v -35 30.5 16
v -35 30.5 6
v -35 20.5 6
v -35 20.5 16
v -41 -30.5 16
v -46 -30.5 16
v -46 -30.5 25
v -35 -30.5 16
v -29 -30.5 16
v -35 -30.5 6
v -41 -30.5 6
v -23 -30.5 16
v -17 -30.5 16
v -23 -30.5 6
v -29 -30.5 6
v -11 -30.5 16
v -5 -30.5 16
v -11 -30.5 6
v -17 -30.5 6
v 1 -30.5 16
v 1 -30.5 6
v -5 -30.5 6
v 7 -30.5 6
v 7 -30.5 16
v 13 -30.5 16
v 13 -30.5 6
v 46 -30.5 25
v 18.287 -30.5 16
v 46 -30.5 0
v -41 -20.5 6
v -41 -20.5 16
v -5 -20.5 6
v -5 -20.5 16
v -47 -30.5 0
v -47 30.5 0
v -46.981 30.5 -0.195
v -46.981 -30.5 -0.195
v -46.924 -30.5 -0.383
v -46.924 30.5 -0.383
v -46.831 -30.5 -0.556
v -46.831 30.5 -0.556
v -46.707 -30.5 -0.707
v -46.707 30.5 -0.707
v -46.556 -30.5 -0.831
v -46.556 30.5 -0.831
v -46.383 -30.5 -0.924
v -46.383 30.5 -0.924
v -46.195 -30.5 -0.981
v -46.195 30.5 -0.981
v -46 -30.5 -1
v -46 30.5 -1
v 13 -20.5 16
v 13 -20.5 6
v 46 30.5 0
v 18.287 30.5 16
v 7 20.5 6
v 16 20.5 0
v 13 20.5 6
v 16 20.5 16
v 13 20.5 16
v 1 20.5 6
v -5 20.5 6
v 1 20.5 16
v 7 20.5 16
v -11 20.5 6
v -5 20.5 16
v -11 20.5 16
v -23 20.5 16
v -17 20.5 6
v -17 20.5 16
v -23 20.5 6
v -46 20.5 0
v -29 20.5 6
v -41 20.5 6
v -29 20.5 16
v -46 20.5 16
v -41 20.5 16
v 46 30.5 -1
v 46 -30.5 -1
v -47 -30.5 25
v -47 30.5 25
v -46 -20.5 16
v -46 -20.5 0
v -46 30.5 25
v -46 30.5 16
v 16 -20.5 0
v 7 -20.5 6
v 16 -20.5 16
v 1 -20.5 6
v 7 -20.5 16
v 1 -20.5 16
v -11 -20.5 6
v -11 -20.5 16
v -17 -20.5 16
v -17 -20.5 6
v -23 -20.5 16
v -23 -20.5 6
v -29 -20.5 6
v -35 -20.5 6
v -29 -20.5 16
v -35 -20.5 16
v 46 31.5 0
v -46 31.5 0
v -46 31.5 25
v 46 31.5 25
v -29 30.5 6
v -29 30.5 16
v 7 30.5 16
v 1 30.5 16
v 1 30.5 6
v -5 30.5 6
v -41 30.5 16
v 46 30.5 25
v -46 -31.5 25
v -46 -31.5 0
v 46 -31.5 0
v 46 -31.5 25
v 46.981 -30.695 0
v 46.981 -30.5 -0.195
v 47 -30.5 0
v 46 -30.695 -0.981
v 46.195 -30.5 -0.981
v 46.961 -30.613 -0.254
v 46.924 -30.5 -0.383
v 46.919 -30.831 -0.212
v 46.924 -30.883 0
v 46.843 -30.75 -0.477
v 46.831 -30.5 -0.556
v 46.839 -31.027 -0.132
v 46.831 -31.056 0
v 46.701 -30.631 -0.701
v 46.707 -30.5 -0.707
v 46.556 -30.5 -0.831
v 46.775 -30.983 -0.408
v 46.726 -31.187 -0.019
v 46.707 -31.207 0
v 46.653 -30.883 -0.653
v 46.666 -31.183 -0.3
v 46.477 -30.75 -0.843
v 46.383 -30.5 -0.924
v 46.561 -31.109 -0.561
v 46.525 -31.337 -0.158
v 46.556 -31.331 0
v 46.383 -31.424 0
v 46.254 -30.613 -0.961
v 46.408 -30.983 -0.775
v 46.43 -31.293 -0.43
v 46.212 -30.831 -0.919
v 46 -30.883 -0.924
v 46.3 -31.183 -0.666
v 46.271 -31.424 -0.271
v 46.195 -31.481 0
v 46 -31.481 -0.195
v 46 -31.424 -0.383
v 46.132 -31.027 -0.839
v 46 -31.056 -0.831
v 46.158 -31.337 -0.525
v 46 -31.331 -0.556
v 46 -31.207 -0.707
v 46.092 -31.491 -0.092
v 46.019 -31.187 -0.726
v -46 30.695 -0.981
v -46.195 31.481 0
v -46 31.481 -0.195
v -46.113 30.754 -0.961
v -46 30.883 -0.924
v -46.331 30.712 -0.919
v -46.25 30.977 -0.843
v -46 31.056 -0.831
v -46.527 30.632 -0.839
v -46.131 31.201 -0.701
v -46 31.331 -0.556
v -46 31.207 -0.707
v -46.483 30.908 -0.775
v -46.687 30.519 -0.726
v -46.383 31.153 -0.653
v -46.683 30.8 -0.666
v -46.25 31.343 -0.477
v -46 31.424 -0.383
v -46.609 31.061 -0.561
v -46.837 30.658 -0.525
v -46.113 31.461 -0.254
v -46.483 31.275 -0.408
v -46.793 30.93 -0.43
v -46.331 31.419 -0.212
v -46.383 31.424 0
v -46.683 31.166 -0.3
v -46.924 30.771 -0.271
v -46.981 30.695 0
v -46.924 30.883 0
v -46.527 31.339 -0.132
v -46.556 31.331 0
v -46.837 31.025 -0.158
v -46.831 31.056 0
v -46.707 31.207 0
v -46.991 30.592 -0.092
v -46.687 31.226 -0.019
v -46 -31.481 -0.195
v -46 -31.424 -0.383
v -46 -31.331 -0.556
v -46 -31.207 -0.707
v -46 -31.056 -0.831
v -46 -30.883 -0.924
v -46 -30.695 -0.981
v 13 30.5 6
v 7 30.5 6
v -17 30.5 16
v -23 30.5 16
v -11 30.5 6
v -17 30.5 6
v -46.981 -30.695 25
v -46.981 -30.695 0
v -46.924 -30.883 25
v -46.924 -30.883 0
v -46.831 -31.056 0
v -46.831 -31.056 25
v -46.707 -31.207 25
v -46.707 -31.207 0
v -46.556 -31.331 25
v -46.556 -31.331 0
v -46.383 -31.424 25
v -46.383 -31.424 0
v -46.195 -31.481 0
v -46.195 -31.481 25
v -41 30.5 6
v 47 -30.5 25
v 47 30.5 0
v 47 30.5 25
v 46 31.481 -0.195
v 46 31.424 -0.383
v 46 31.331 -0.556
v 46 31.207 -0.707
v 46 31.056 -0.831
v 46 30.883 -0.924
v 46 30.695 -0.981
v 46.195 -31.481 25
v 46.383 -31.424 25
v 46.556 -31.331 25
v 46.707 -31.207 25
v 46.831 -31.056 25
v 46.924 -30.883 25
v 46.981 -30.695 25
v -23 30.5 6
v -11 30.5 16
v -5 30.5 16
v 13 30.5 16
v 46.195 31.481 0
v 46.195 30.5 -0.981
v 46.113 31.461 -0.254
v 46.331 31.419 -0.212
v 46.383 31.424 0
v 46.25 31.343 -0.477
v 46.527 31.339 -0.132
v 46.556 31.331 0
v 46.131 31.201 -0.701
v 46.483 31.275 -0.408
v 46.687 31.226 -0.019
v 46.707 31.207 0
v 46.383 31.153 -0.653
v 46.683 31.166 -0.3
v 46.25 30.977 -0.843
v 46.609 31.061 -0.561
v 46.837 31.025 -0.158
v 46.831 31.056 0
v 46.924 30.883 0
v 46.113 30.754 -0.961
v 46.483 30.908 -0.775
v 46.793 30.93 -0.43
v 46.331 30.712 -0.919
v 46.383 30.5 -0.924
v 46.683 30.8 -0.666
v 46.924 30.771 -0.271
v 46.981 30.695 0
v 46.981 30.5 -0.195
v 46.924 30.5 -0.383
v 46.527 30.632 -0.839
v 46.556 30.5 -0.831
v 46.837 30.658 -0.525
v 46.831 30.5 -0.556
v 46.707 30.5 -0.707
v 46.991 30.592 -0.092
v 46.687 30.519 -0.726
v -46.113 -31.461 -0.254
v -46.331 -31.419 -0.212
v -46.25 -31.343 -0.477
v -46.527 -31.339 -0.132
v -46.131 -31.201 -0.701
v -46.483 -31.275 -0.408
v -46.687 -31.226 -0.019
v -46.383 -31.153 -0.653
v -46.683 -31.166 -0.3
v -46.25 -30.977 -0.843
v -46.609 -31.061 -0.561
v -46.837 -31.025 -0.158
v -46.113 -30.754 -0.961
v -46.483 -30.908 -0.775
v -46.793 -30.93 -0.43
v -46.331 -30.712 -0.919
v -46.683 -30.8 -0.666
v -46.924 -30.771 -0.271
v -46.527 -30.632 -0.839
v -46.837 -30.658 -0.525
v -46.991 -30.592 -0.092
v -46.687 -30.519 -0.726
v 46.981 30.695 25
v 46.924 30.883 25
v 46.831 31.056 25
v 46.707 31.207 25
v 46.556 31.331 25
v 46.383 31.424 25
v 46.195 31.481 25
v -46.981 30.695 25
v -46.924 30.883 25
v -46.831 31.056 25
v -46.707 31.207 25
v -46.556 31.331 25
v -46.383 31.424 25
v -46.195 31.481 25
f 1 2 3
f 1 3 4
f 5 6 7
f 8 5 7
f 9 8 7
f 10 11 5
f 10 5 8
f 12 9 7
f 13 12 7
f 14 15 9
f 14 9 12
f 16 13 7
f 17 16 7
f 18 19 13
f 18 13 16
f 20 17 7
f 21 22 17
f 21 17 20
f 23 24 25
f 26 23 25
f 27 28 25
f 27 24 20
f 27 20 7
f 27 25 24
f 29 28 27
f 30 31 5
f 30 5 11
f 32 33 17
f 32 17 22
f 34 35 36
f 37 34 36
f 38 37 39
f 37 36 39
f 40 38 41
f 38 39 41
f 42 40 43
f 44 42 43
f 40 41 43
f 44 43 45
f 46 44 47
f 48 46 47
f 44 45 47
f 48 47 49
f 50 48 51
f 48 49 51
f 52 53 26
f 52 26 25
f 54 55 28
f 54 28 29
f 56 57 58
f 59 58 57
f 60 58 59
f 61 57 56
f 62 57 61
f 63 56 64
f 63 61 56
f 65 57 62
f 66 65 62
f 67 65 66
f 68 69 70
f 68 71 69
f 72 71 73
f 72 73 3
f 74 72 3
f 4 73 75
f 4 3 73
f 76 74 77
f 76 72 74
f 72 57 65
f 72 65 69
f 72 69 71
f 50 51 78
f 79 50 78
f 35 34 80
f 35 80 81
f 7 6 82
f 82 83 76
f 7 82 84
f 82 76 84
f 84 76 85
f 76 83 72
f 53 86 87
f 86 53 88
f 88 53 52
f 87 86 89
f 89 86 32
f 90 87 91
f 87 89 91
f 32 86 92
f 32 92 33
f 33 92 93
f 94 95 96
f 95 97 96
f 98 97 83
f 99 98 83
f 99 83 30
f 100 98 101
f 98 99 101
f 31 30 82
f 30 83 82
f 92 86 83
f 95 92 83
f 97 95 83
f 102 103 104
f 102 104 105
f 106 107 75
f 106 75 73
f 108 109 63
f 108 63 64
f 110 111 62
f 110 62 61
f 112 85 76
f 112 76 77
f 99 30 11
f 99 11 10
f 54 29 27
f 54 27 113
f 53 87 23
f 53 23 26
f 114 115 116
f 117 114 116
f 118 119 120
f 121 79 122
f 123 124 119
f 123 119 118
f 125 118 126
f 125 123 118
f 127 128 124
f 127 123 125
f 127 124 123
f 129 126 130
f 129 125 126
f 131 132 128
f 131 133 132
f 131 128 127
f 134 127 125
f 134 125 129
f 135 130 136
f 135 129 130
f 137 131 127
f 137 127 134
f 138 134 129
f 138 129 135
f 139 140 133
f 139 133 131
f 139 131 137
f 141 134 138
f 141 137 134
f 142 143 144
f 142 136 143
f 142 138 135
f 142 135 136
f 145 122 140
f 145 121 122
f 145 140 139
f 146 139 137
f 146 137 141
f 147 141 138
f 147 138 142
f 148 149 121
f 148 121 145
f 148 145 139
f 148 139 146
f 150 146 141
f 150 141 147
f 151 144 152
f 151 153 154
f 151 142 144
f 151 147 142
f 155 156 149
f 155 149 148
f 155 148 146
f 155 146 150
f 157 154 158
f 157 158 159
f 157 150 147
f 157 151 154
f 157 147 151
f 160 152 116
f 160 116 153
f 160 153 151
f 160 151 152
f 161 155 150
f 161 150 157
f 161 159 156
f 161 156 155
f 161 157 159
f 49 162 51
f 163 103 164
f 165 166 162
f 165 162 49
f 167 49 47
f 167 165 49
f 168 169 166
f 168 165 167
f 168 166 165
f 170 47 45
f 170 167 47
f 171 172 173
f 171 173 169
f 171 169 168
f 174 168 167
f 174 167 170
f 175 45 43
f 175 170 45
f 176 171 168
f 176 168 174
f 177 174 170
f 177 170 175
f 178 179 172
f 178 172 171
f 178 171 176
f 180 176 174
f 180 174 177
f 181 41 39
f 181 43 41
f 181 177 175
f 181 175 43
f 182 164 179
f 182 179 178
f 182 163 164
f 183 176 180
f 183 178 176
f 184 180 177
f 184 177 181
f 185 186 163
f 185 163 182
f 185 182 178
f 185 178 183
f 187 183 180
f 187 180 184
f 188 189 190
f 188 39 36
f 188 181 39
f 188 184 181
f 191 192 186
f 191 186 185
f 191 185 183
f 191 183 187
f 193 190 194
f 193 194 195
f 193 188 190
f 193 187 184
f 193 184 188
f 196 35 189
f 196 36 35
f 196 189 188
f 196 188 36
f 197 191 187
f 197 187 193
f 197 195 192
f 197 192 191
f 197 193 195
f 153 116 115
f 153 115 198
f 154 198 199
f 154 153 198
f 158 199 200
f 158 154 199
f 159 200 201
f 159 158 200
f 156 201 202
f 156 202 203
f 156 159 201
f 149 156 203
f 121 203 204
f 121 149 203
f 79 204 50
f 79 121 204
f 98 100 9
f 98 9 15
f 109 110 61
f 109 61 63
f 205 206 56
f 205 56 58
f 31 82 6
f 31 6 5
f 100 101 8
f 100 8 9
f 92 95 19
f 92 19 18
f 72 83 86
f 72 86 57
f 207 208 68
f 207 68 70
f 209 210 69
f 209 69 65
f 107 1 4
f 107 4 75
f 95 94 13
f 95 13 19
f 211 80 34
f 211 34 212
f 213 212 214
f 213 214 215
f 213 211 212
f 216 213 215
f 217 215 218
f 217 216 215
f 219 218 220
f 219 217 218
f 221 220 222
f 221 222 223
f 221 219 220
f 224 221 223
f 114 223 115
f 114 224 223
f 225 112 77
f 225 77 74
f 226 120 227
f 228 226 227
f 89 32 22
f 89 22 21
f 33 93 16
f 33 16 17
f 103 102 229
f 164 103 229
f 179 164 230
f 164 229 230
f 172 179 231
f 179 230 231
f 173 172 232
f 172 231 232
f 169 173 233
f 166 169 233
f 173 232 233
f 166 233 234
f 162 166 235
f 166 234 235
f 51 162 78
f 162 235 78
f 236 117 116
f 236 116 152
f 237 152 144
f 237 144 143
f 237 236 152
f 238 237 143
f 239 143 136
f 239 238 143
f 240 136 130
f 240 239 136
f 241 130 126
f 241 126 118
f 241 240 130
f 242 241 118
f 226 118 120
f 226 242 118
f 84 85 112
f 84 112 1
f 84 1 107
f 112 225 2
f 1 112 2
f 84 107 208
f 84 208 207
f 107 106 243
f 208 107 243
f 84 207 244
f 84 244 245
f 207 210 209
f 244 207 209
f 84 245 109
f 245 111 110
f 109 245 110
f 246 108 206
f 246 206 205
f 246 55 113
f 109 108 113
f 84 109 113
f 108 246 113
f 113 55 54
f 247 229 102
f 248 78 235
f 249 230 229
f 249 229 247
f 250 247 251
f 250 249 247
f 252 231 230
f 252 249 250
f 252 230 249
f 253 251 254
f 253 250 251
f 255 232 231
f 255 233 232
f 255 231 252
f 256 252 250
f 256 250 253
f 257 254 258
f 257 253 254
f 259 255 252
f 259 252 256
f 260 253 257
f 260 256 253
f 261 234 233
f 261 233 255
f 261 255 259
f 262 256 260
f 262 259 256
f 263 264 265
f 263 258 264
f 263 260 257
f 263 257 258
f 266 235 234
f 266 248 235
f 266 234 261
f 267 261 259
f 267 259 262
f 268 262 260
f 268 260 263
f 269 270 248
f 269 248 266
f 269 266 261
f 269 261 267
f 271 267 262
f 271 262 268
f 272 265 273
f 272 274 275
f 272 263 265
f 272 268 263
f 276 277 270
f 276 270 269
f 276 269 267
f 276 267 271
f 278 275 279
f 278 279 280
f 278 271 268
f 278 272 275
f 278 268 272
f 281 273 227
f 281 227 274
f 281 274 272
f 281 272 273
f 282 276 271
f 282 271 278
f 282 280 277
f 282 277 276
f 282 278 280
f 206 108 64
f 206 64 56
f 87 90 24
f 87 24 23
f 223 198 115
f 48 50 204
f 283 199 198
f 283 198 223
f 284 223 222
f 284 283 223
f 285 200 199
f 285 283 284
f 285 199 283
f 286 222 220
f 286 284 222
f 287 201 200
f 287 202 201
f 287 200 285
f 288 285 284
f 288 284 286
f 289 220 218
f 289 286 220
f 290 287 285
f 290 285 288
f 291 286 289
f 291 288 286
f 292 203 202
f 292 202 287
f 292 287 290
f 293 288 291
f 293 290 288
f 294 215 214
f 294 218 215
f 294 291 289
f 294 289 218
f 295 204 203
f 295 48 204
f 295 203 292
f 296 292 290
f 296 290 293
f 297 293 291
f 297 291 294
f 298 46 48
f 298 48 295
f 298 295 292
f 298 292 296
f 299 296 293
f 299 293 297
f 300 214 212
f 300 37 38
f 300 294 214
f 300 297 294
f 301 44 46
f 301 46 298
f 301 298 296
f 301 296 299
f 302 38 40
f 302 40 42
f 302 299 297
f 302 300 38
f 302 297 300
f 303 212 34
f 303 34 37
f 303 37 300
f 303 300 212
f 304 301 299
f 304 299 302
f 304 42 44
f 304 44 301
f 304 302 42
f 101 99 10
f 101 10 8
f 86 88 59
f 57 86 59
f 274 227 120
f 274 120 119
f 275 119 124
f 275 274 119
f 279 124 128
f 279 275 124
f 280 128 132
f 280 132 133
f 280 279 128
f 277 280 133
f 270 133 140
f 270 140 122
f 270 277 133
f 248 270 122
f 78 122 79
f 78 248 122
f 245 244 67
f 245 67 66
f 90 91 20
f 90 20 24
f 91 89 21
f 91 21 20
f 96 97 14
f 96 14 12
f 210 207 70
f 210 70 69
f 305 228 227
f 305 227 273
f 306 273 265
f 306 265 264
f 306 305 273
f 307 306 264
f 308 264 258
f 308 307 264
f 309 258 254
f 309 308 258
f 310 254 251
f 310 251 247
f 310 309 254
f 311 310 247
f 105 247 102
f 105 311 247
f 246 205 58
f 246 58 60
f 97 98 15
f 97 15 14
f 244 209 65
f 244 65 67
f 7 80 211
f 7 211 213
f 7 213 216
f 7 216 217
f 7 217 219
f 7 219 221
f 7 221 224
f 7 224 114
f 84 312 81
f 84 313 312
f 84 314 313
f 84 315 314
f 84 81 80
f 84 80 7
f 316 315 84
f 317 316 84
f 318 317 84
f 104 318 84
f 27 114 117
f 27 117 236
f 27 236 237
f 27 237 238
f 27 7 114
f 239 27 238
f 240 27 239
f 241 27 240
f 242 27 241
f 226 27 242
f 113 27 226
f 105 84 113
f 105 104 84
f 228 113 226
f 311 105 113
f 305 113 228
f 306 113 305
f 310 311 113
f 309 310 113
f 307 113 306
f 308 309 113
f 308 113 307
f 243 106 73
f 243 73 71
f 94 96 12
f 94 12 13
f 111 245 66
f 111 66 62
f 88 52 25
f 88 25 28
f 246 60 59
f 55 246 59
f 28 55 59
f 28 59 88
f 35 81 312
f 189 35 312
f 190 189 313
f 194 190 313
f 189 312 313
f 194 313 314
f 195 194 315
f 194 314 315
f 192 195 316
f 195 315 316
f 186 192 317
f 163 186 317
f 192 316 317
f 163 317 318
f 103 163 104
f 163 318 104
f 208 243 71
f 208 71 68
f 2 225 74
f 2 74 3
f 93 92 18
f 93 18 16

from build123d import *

# Parameters (mm, degrees)
SKETCH003_W     = 92
SKETCH003_H     = 61
PAD002_DEPTH    = 25
THICKNESS001_T  = 1
PAD003_DEPTH    = 61
SKETCH005_W     = 41
SKETCH005_H     = 25
POCKET001_DEPTH = 62


with BuildPart() as part:
    # Sketch003 → Pad002 (new body)
    with BuildSketch(Plane.XY):
        Rectangle(SKETCH003_W, SKETCH003_H)
    extrude(amount=PAD002_DEPTH)

    # Thickness001
    thickness001_openings = [part.faces().sort_by_distance(p)[0] for p in [
        (0, 0, 25),
    ]]
    offset(amount=THICKNESS001_T, openings=thickness001_openings)

    # Sketch004 (on DatumPlane) → Pad003 (join)
    with BuildSketch(Plane.XZ.offset(-30.5)):
        Polygon((46, 0), (-46, 0), (-46, 16), (-41, 16), (-41, 6), (-35, 6), (-35, 16), (-29, 16), (-29, 6), (-23, 6), (-23, 16), (-17, 16), (-17, 6), (-11, 6), (-11, 16), (-5, 16), (-5, 6), (1, 6), (1, 16), (7, 16), (7, 6), (13, 6), (13, 16), (18.287187, 16), align=None)
    extrude(amount=PAD003_DEPTH)

    # Sketch005 (on DatumPlane) → Pocket001 (cut)
    with BuildSketch(Plane.YZ.offset(-46)):
        with Locations((0, 12.5)):
            Rectangle(SKETCH005_W, SKETCH005_H)
    extrude(amount=POCKET001_DEPTH, mode=Mode.SUBTRACT)


solid = part.part
